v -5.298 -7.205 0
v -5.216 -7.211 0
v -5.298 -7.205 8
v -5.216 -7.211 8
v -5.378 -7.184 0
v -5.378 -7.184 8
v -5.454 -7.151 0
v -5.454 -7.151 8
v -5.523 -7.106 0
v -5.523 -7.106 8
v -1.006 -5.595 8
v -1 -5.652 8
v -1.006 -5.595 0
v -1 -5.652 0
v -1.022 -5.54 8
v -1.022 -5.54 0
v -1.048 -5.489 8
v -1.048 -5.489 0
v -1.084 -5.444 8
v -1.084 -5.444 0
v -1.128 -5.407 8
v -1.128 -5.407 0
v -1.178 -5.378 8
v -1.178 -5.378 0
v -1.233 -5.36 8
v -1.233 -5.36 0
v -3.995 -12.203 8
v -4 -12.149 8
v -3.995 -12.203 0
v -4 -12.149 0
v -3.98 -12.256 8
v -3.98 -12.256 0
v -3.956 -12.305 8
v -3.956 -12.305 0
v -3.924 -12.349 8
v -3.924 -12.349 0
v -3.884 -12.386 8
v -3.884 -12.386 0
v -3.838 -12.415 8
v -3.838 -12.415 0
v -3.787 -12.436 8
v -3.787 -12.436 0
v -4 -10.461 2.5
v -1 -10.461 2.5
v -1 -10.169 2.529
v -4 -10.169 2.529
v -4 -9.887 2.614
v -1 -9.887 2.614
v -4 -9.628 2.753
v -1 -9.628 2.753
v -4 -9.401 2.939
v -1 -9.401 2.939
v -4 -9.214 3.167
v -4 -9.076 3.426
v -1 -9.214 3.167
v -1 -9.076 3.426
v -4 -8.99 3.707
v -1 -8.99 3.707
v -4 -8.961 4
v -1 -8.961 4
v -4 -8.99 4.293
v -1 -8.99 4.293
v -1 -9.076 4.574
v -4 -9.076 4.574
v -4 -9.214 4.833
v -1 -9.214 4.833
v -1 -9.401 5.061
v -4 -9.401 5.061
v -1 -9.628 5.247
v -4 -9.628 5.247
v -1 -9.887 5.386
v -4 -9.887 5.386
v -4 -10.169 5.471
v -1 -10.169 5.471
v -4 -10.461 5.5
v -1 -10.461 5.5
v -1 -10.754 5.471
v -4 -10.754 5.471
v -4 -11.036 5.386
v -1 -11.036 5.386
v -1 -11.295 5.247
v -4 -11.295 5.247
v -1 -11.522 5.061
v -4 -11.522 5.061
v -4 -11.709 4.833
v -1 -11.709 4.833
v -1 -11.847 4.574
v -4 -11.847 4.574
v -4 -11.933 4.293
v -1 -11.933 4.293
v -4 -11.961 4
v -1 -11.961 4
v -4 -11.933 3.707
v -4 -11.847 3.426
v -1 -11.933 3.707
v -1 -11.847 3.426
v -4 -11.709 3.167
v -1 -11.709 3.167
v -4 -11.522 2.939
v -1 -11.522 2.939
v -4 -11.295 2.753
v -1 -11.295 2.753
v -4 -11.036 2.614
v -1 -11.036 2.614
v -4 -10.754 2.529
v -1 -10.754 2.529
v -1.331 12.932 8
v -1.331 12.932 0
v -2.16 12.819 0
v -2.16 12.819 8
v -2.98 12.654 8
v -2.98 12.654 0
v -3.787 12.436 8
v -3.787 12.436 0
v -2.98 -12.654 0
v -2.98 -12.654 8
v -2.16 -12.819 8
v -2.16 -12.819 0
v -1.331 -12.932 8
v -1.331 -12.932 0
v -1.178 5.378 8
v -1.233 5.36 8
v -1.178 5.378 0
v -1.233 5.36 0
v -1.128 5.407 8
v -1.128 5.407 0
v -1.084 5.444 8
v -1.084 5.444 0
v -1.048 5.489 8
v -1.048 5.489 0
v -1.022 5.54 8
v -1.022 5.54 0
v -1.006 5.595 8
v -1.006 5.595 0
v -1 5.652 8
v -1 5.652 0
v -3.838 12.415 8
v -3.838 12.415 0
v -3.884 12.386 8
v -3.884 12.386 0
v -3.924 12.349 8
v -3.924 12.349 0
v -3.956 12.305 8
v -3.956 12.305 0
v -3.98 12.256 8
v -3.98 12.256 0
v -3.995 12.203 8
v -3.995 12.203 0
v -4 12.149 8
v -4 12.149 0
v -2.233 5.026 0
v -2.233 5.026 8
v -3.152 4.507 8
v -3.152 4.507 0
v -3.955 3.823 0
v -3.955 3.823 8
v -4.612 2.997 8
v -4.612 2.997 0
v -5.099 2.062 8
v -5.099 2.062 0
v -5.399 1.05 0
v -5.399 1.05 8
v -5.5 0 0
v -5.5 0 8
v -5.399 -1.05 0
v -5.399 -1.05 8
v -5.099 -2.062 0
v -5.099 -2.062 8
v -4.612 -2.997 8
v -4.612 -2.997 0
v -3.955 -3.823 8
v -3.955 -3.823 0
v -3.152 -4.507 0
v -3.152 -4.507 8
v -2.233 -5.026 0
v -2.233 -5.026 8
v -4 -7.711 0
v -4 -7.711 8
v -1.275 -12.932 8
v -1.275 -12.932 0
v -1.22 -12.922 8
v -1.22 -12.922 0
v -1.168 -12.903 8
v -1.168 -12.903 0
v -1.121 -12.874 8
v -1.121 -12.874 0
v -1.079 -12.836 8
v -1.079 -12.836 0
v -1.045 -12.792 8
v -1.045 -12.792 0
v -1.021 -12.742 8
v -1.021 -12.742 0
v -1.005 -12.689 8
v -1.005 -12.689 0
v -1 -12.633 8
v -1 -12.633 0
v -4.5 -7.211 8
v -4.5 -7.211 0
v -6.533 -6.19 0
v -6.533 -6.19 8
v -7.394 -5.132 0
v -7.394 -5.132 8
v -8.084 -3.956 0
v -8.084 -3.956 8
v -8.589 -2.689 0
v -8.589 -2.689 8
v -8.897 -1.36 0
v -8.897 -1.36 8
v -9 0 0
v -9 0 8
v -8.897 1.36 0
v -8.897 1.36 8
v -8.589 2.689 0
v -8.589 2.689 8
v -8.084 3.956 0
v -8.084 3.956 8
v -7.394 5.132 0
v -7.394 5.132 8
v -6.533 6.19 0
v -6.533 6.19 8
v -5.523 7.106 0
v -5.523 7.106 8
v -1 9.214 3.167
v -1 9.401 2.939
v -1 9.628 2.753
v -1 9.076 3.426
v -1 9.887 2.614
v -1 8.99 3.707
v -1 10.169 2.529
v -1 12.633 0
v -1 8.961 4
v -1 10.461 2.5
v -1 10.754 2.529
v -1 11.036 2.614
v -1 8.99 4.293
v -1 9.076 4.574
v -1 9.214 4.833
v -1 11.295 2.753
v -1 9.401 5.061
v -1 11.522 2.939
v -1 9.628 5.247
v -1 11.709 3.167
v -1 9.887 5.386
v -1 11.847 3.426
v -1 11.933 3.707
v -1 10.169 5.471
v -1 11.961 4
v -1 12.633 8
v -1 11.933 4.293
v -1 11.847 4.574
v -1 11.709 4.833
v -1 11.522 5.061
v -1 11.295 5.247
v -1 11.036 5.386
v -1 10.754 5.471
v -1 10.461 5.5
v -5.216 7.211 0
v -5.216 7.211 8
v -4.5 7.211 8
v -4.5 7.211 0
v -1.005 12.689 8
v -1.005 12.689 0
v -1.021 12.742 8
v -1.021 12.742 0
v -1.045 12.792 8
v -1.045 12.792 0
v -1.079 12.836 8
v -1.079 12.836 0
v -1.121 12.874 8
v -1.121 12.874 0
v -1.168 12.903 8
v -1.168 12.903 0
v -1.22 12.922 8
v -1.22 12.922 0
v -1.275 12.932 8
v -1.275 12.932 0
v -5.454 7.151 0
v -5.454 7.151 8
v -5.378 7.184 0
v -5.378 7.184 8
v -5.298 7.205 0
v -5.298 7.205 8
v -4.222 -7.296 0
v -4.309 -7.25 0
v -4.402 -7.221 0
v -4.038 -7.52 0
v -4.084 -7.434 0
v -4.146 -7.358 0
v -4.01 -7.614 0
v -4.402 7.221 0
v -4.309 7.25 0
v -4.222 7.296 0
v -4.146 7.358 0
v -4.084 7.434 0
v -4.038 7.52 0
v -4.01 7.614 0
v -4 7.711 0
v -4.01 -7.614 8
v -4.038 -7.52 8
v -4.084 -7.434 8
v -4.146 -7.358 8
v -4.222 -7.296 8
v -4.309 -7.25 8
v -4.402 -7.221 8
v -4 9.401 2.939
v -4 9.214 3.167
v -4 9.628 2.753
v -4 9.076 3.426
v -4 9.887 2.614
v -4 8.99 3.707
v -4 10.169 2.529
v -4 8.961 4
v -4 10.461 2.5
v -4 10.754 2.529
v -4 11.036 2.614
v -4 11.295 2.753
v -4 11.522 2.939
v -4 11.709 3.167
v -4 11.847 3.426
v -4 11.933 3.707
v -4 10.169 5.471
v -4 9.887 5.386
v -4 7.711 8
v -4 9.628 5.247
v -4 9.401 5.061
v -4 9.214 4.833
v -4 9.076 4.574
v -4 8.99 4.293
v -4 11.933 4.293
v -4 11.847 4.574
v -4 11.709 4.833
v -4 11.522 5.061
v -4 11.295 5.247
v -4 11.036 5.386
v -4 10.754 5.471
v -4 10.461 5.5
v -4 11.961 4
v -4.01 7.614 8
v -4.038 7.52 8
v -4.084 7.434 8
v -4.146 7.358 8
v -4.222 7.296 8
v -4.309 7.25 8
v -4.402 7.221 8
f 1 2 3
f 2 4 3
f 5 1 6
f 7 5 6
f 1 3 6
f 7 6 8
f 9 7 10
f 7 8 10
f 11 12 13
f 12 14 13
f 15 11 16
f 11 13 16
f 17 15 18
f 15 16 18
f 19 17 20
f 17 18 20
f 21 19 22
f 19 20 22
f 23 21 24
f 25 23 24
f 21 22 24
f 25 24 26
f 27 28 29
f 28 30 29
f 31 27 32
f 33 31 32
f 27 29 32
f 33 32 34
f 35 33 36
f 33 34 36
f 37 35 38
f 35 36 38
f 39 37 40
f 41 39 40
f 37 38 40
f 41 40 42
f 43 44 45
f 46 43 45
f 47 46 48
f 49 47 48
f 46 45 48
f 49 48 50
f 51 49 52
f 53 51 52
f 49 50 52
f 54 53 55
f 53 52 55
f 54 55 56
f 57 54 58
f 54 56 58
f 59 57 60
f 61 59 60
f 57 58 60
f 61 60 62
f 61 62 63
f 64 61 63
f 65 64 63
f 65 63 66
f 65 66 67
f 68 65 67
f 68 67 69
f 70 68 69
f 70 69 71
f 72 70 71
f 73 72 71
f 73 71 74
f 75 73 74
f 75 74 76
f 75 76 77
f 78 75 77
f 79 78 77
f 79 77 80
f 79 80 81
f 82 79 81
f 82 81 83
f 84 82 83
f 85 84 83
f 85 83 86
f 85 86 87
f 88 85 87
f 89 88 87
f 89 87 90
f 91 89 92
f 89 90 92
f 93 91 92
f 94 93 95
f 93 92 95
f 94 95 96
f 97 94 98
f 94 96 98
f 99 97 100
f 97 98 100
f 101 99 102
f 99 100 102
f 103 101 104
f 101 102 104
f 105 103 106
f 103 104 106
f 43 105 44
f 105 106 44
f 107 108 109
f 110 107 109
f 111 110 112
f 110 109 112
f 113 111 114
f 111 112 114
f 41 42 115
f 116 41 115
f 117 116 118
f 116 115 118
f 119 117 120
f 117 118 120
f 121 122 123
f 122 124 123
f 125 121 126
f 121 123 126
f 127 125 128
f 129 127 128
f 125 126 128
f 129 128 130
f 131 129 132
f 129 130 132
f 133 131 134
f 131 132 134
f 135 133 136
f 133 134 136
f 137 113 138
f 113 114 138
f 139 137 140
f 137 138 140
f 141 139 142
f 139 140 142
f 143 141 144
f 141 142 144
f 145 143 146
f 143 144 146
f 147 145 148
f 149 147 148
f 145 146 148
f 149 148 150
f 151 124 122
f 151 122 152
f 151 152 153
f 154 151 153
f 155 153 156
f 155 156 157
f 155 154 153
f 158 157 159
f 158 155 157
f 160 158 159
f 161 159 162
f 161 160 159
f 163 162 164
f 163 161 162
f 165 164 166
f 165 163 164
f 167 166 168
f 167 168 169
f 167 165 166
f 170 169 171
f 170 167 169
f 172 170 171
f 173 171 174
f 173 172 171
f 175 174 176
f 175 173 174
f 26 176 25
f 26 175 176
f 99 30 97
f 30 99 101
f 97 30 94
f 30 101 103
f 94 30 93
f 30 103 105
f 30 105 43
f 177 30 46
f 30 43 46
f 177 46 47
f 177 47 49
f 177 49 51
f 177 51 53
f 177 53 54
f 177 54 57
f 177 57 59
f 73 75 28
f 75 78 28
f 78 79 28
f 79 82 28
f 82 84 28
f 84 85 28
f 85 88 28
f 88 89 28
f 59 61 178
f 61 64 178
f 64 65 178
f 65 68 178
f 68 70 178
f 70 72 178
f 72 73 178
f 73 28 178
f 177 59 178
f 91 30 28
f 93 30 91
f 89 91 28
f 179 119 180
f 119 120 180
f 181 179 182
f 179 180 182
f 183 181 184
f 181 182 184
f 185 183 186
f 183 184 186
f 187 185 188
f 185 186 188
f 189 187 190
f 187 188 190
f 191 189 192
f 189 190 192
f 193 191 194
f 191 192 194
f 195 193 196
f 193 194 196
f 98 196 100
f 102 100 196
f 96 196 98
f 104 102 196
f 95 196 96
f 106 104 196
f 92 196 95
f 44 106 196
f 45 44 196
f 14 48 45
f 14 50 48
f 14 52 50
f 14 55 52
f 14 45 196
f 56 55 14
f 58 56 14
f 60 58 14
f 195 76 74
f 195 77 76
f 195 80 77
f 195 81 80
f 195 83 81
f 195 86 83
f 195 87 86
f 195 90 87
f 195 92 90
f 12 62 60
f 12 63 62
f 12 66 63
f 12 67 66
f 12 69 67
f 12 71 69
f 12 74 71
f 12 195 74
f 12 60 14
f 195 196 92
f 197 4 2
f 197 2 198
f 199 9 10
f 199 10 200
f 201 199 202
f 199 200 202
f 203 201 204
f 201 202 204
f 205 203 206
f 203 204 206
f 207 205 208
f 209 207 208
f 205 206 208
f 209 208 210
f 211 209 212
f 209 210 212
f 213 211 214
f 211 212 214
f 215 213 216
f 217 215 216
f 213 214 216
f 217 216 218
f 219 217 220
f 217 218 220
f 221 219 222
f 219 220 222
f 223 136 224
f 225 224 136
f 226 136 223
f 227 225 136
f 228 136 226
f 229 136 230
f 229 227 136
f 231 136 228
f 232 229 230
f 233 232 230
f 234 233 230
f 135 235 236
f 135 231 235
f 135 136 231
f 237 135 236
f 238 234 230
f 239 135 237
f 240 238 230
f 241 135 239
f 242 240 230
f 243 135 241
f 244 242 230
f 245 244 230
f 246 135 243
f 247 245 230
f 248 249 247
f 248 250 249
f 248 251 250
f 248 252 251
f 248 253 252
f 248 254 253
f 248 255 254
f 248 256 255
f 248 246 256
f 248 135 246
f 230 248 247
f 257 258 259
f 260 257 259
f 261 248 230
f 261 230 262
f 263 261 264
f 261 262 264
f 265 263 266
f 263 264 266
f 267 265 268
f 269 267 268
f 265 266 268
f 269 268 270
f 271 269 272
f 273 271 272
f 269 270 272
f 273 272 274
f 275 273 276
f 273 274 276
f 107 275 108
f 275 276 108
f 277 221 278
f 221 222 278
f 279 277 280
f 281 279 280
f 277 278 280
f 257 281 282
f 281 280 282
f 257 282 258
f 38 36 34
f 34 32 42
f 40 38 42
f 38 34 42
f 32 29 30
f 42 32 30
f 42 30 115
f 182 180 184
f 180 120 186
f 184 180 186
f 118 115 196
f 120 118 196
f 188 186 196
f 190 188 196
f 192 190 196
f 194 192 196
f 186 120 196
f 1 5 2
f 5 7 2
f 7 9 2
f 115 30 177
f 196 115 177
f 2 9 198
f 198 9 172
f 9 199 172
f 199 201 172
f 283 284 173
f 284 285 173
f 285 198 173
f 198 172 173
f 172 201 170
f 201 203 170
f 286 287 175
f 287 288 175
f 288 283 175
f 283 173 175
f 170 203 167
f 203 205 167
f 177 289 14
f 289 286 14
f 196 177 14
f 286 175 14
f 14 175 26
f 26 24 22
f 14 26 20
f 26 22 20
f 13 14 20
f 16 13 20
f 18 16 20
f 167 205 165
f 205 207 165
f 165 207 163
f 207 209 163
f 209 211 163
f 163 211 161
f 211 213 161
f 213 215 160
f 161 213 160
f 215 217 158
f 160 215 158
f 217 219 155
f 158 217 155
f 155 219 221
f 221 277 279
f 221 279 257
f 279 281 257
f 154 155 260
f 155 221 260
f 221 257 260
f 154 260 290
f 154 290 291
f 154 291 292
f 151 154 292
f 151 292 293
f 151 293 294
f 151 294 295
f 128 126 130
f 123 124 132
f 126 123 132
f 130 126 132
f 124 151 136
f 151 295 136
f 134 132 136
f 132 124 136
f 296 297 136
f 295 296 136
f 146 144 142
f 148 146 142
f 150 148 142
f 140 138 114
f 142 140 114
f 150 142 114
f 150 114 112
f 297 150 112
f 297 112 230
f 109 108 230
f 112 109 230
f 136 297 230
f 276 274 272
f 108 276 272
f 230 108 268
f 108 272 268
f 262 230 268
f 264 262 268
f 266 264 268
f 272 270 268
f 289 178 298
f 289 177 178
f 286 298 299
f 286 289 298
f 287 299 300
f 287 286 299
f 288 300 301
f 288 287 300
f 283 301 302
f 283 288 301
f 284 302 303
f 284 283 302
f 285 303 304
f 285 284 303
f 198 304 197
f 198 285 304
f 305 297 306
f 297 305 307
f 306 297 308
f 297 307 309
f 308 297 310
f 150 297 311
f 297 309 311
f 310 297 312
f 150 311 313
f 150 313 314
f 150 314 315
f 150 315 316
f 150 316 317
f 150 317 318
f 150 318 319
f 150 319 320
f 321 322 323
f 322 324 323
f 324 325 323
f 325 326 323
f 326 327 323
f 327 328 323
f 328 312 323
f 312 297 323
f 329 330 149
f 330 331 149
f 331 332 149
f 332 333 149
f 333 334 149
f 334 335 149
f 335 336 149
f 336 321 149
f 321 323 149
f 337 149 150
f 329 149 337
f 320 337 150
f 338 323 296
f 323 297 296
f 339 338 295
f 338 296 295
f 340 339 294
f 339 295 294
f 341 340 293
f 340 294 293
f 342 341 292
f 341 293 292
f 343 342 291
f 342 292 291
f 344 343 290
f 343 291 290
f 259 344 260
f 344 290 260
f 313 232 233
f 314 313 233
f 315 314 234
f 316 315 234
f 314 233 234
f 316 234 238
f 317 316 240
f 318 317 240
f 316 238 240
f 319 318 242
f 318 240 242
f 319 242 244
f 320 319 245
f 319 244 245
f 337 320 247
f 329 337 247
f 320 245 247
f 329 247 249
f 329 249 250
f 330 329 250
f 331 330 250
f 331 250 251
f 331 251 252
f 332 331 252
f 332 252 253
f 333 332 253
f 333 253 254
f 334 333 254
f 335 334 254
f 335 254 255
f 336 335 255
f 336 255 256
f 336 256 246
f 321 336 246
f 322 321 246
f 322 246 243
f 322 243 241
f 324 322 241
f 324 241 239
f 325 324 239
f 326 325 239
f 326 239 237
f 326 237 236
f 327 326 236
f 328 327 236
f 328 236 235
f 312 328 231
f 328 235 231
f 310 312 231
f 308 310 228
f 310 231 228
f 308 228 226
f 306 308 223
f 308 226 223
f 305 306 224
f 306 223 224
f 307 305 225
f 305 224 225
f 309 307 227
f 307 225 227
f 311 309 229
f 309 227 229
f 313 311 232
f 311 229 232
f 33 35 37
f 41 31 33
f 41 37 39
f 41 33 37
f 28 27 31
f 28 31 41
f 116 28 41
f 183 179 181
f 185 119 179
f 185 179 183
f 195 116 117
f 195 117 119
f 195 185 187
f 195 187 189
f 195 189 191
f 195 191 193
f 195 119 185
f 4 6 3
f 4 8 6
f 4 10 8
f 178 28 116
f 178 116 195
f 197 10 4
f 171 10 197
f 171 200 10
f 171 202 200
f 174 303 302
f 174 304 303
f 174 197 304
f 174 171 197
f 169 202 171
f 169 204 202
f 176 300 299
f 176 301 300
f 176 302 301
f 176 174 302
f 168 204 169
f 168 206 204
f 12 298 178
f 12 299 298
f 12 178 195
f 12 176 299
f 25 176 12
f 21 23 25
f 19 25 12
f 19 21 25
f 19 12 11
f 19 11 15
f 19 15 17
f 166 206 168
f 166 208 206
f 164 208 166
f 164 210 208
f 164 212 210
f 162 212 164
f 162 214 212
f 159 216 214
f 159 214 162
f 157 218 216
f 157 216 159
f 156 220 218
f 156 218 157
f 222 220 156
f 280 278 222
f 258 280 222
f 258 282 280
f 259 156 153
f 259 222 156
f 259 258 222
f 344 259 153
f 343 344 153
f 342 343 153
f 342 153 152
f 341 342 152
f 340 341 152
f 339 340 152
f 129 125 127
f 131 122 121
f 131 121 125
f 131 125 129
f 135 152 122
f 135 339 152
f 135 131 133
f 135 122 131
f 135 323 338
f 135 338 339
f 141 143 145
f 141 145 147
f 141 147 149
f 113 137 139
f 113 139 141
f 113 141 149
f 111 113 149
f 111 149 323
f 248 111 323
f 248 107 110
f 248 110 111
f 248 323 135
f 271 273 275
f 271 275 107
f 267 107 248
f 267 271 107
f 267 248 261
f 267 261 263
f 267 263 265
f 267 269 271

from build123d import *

# Parameters (mm, degrees)
ESQUISSE1_R             = 13
ESQUISSE1_R_2           = 5.5
BOSS_EXTRU_1_DEPTH      = 8
ESQUISSE2_W             = 32.31004566
ESQUISSE2_H             = 49.818141682
ENL_V_MAT_EXTRU_1_DEPTH = 8
ESQUISSE3_R             = 1.5
ENL_V_MAT_EXTRU_2_DEPTH = 8
ESQUISSE4_W             = 24.87123002
ESQUISSE4_H             = 13.833010023
ESQUISSE4_W_2           = 23.432073676
ESQUISSE4_H_2           = 10.309386407
ENL_V_MAT_EXTRU_3_DEPTH = 8
ENL_V_MAT_EXTRU_4_DEPTH = 8
CONG_1_R                = 0.5
CONG_3_R                = 0.3
CONG_4_R                = 0.5


with BuildPart() as part:
    # Esquisse1 → Boss.-Extru.1 (new body)
    with BuildSketch(Plane.XY):
        Circle(ESQUISSE1_R)
        Circle(ESQUISSE1_R_2, mode=Mode.SUBTRACT)
    extrude(amount=BOSS_EXTRU_1_DEPTH)

    # Esquisse2 → Enlèv. mat.-Extru.1 (cut)
    with BuildSketch(Plane.XY.offset(8)):
        with Locations((15.15502283, -0.665904075)):
            Rectangle(ESQUISSE2_W, ESQUISSE2_H)
    extrude(amount=-ENL_V_MAT_EXTRU_1_DEPTH, mode=Mode.SUBTRACT)

    # Esquisse3 → Enlèv. mat.-Extru.2 (cut)
    with BuildSketch(Plane(origin=(-1, 0, 0), x_dir=(0, 0, -1), z_dir=(1, 0, 0))):
        with Locations((-4, 10.461481397)):
            Circle(ESQUISSE3_R)
        with Locations((-4, -10.461481397)):
            Circle(ESQUISSE3_R)
    extrude(amount=-ENL_V_MAT_EXTRU_2_DEPTH, mode=Mode.SUBTRACT)

    # Esquisse4 → Enlèv. mat.-Extru.3 (cut)
    with BuildSketch(Plane.XY.offset(8)):
        with Locations((-16.43561501, 14.127986408)):
            Rectangle(ESQUISSE4_W, ESQUISSE4_H)
        with Locations((-15.716036838, -12.366174601)):
            Rectangle(ESQUISSE4_W_2, ESQUISSE4_H_2)
    extrude(amount=-ENL_V_MAT_EXTRU_3_DEPTH, mode=Mode.SUBTRACT)

    # Esquisse6 → Enlèv. mat.-Extru.4 (cut)
    with BuildSketch(Plane.XY.offset(8)):
        with BuildLine():
            Line((-15.190239973, -9.672332462), (-4.630180203, -7.717605282))
            ThreePointArc((-4.630180203, -7.717605282), (-8.999645968, -0.079827604), (-4.766352493, 7.63425726))
            Line((-4.766352493, 7.63425726), (-11.634503641, 11.269457117))
            ThreePointArc((-11.634503641, 11.269457117), (-18.222154917, 1.615222264), (-15.190239973, -9.672332462))
        make_face()
    extrude(amount=-ENL_V_MAT_EXTRU_4_DEPTH, mode=Mode.SUBTRACT)

    # Congé1
    cong_1_edges = [part.edges().sort_by_distance(p)[0] for p in [
        (-4, 7.211481397, 4),
        (-4, -7.211481397, 4),
    ]]
    fillet(cong_1_edges, radius=CONG_1_R)

    # Congé3
    cong_3_edges = [part.edges().sort_by_distance(p)[0] for p in [
        (-1, -5.408326913, 4),
        (-1, 5.408326913, 4),
        (-1, 12.961481397, 4),
        (-1, -12.961481397, 4),
        (-4, 12.369316877, 4),
        (-4, -12.369316877, 4),
    ]]
    fillet(cong_3_edges, radius=CONG_3_R)

    # Congé4
    cong_4_edges = [part.edges().sort_by_distance(p)[0] for p in [
        (-5.384657469, 7.211481397, 4),
        (-5.384657469, -7.211481397, 4),
    ]]
    fillet(cong_4_edges, radius=CONG_4_R)


solid = part.part
